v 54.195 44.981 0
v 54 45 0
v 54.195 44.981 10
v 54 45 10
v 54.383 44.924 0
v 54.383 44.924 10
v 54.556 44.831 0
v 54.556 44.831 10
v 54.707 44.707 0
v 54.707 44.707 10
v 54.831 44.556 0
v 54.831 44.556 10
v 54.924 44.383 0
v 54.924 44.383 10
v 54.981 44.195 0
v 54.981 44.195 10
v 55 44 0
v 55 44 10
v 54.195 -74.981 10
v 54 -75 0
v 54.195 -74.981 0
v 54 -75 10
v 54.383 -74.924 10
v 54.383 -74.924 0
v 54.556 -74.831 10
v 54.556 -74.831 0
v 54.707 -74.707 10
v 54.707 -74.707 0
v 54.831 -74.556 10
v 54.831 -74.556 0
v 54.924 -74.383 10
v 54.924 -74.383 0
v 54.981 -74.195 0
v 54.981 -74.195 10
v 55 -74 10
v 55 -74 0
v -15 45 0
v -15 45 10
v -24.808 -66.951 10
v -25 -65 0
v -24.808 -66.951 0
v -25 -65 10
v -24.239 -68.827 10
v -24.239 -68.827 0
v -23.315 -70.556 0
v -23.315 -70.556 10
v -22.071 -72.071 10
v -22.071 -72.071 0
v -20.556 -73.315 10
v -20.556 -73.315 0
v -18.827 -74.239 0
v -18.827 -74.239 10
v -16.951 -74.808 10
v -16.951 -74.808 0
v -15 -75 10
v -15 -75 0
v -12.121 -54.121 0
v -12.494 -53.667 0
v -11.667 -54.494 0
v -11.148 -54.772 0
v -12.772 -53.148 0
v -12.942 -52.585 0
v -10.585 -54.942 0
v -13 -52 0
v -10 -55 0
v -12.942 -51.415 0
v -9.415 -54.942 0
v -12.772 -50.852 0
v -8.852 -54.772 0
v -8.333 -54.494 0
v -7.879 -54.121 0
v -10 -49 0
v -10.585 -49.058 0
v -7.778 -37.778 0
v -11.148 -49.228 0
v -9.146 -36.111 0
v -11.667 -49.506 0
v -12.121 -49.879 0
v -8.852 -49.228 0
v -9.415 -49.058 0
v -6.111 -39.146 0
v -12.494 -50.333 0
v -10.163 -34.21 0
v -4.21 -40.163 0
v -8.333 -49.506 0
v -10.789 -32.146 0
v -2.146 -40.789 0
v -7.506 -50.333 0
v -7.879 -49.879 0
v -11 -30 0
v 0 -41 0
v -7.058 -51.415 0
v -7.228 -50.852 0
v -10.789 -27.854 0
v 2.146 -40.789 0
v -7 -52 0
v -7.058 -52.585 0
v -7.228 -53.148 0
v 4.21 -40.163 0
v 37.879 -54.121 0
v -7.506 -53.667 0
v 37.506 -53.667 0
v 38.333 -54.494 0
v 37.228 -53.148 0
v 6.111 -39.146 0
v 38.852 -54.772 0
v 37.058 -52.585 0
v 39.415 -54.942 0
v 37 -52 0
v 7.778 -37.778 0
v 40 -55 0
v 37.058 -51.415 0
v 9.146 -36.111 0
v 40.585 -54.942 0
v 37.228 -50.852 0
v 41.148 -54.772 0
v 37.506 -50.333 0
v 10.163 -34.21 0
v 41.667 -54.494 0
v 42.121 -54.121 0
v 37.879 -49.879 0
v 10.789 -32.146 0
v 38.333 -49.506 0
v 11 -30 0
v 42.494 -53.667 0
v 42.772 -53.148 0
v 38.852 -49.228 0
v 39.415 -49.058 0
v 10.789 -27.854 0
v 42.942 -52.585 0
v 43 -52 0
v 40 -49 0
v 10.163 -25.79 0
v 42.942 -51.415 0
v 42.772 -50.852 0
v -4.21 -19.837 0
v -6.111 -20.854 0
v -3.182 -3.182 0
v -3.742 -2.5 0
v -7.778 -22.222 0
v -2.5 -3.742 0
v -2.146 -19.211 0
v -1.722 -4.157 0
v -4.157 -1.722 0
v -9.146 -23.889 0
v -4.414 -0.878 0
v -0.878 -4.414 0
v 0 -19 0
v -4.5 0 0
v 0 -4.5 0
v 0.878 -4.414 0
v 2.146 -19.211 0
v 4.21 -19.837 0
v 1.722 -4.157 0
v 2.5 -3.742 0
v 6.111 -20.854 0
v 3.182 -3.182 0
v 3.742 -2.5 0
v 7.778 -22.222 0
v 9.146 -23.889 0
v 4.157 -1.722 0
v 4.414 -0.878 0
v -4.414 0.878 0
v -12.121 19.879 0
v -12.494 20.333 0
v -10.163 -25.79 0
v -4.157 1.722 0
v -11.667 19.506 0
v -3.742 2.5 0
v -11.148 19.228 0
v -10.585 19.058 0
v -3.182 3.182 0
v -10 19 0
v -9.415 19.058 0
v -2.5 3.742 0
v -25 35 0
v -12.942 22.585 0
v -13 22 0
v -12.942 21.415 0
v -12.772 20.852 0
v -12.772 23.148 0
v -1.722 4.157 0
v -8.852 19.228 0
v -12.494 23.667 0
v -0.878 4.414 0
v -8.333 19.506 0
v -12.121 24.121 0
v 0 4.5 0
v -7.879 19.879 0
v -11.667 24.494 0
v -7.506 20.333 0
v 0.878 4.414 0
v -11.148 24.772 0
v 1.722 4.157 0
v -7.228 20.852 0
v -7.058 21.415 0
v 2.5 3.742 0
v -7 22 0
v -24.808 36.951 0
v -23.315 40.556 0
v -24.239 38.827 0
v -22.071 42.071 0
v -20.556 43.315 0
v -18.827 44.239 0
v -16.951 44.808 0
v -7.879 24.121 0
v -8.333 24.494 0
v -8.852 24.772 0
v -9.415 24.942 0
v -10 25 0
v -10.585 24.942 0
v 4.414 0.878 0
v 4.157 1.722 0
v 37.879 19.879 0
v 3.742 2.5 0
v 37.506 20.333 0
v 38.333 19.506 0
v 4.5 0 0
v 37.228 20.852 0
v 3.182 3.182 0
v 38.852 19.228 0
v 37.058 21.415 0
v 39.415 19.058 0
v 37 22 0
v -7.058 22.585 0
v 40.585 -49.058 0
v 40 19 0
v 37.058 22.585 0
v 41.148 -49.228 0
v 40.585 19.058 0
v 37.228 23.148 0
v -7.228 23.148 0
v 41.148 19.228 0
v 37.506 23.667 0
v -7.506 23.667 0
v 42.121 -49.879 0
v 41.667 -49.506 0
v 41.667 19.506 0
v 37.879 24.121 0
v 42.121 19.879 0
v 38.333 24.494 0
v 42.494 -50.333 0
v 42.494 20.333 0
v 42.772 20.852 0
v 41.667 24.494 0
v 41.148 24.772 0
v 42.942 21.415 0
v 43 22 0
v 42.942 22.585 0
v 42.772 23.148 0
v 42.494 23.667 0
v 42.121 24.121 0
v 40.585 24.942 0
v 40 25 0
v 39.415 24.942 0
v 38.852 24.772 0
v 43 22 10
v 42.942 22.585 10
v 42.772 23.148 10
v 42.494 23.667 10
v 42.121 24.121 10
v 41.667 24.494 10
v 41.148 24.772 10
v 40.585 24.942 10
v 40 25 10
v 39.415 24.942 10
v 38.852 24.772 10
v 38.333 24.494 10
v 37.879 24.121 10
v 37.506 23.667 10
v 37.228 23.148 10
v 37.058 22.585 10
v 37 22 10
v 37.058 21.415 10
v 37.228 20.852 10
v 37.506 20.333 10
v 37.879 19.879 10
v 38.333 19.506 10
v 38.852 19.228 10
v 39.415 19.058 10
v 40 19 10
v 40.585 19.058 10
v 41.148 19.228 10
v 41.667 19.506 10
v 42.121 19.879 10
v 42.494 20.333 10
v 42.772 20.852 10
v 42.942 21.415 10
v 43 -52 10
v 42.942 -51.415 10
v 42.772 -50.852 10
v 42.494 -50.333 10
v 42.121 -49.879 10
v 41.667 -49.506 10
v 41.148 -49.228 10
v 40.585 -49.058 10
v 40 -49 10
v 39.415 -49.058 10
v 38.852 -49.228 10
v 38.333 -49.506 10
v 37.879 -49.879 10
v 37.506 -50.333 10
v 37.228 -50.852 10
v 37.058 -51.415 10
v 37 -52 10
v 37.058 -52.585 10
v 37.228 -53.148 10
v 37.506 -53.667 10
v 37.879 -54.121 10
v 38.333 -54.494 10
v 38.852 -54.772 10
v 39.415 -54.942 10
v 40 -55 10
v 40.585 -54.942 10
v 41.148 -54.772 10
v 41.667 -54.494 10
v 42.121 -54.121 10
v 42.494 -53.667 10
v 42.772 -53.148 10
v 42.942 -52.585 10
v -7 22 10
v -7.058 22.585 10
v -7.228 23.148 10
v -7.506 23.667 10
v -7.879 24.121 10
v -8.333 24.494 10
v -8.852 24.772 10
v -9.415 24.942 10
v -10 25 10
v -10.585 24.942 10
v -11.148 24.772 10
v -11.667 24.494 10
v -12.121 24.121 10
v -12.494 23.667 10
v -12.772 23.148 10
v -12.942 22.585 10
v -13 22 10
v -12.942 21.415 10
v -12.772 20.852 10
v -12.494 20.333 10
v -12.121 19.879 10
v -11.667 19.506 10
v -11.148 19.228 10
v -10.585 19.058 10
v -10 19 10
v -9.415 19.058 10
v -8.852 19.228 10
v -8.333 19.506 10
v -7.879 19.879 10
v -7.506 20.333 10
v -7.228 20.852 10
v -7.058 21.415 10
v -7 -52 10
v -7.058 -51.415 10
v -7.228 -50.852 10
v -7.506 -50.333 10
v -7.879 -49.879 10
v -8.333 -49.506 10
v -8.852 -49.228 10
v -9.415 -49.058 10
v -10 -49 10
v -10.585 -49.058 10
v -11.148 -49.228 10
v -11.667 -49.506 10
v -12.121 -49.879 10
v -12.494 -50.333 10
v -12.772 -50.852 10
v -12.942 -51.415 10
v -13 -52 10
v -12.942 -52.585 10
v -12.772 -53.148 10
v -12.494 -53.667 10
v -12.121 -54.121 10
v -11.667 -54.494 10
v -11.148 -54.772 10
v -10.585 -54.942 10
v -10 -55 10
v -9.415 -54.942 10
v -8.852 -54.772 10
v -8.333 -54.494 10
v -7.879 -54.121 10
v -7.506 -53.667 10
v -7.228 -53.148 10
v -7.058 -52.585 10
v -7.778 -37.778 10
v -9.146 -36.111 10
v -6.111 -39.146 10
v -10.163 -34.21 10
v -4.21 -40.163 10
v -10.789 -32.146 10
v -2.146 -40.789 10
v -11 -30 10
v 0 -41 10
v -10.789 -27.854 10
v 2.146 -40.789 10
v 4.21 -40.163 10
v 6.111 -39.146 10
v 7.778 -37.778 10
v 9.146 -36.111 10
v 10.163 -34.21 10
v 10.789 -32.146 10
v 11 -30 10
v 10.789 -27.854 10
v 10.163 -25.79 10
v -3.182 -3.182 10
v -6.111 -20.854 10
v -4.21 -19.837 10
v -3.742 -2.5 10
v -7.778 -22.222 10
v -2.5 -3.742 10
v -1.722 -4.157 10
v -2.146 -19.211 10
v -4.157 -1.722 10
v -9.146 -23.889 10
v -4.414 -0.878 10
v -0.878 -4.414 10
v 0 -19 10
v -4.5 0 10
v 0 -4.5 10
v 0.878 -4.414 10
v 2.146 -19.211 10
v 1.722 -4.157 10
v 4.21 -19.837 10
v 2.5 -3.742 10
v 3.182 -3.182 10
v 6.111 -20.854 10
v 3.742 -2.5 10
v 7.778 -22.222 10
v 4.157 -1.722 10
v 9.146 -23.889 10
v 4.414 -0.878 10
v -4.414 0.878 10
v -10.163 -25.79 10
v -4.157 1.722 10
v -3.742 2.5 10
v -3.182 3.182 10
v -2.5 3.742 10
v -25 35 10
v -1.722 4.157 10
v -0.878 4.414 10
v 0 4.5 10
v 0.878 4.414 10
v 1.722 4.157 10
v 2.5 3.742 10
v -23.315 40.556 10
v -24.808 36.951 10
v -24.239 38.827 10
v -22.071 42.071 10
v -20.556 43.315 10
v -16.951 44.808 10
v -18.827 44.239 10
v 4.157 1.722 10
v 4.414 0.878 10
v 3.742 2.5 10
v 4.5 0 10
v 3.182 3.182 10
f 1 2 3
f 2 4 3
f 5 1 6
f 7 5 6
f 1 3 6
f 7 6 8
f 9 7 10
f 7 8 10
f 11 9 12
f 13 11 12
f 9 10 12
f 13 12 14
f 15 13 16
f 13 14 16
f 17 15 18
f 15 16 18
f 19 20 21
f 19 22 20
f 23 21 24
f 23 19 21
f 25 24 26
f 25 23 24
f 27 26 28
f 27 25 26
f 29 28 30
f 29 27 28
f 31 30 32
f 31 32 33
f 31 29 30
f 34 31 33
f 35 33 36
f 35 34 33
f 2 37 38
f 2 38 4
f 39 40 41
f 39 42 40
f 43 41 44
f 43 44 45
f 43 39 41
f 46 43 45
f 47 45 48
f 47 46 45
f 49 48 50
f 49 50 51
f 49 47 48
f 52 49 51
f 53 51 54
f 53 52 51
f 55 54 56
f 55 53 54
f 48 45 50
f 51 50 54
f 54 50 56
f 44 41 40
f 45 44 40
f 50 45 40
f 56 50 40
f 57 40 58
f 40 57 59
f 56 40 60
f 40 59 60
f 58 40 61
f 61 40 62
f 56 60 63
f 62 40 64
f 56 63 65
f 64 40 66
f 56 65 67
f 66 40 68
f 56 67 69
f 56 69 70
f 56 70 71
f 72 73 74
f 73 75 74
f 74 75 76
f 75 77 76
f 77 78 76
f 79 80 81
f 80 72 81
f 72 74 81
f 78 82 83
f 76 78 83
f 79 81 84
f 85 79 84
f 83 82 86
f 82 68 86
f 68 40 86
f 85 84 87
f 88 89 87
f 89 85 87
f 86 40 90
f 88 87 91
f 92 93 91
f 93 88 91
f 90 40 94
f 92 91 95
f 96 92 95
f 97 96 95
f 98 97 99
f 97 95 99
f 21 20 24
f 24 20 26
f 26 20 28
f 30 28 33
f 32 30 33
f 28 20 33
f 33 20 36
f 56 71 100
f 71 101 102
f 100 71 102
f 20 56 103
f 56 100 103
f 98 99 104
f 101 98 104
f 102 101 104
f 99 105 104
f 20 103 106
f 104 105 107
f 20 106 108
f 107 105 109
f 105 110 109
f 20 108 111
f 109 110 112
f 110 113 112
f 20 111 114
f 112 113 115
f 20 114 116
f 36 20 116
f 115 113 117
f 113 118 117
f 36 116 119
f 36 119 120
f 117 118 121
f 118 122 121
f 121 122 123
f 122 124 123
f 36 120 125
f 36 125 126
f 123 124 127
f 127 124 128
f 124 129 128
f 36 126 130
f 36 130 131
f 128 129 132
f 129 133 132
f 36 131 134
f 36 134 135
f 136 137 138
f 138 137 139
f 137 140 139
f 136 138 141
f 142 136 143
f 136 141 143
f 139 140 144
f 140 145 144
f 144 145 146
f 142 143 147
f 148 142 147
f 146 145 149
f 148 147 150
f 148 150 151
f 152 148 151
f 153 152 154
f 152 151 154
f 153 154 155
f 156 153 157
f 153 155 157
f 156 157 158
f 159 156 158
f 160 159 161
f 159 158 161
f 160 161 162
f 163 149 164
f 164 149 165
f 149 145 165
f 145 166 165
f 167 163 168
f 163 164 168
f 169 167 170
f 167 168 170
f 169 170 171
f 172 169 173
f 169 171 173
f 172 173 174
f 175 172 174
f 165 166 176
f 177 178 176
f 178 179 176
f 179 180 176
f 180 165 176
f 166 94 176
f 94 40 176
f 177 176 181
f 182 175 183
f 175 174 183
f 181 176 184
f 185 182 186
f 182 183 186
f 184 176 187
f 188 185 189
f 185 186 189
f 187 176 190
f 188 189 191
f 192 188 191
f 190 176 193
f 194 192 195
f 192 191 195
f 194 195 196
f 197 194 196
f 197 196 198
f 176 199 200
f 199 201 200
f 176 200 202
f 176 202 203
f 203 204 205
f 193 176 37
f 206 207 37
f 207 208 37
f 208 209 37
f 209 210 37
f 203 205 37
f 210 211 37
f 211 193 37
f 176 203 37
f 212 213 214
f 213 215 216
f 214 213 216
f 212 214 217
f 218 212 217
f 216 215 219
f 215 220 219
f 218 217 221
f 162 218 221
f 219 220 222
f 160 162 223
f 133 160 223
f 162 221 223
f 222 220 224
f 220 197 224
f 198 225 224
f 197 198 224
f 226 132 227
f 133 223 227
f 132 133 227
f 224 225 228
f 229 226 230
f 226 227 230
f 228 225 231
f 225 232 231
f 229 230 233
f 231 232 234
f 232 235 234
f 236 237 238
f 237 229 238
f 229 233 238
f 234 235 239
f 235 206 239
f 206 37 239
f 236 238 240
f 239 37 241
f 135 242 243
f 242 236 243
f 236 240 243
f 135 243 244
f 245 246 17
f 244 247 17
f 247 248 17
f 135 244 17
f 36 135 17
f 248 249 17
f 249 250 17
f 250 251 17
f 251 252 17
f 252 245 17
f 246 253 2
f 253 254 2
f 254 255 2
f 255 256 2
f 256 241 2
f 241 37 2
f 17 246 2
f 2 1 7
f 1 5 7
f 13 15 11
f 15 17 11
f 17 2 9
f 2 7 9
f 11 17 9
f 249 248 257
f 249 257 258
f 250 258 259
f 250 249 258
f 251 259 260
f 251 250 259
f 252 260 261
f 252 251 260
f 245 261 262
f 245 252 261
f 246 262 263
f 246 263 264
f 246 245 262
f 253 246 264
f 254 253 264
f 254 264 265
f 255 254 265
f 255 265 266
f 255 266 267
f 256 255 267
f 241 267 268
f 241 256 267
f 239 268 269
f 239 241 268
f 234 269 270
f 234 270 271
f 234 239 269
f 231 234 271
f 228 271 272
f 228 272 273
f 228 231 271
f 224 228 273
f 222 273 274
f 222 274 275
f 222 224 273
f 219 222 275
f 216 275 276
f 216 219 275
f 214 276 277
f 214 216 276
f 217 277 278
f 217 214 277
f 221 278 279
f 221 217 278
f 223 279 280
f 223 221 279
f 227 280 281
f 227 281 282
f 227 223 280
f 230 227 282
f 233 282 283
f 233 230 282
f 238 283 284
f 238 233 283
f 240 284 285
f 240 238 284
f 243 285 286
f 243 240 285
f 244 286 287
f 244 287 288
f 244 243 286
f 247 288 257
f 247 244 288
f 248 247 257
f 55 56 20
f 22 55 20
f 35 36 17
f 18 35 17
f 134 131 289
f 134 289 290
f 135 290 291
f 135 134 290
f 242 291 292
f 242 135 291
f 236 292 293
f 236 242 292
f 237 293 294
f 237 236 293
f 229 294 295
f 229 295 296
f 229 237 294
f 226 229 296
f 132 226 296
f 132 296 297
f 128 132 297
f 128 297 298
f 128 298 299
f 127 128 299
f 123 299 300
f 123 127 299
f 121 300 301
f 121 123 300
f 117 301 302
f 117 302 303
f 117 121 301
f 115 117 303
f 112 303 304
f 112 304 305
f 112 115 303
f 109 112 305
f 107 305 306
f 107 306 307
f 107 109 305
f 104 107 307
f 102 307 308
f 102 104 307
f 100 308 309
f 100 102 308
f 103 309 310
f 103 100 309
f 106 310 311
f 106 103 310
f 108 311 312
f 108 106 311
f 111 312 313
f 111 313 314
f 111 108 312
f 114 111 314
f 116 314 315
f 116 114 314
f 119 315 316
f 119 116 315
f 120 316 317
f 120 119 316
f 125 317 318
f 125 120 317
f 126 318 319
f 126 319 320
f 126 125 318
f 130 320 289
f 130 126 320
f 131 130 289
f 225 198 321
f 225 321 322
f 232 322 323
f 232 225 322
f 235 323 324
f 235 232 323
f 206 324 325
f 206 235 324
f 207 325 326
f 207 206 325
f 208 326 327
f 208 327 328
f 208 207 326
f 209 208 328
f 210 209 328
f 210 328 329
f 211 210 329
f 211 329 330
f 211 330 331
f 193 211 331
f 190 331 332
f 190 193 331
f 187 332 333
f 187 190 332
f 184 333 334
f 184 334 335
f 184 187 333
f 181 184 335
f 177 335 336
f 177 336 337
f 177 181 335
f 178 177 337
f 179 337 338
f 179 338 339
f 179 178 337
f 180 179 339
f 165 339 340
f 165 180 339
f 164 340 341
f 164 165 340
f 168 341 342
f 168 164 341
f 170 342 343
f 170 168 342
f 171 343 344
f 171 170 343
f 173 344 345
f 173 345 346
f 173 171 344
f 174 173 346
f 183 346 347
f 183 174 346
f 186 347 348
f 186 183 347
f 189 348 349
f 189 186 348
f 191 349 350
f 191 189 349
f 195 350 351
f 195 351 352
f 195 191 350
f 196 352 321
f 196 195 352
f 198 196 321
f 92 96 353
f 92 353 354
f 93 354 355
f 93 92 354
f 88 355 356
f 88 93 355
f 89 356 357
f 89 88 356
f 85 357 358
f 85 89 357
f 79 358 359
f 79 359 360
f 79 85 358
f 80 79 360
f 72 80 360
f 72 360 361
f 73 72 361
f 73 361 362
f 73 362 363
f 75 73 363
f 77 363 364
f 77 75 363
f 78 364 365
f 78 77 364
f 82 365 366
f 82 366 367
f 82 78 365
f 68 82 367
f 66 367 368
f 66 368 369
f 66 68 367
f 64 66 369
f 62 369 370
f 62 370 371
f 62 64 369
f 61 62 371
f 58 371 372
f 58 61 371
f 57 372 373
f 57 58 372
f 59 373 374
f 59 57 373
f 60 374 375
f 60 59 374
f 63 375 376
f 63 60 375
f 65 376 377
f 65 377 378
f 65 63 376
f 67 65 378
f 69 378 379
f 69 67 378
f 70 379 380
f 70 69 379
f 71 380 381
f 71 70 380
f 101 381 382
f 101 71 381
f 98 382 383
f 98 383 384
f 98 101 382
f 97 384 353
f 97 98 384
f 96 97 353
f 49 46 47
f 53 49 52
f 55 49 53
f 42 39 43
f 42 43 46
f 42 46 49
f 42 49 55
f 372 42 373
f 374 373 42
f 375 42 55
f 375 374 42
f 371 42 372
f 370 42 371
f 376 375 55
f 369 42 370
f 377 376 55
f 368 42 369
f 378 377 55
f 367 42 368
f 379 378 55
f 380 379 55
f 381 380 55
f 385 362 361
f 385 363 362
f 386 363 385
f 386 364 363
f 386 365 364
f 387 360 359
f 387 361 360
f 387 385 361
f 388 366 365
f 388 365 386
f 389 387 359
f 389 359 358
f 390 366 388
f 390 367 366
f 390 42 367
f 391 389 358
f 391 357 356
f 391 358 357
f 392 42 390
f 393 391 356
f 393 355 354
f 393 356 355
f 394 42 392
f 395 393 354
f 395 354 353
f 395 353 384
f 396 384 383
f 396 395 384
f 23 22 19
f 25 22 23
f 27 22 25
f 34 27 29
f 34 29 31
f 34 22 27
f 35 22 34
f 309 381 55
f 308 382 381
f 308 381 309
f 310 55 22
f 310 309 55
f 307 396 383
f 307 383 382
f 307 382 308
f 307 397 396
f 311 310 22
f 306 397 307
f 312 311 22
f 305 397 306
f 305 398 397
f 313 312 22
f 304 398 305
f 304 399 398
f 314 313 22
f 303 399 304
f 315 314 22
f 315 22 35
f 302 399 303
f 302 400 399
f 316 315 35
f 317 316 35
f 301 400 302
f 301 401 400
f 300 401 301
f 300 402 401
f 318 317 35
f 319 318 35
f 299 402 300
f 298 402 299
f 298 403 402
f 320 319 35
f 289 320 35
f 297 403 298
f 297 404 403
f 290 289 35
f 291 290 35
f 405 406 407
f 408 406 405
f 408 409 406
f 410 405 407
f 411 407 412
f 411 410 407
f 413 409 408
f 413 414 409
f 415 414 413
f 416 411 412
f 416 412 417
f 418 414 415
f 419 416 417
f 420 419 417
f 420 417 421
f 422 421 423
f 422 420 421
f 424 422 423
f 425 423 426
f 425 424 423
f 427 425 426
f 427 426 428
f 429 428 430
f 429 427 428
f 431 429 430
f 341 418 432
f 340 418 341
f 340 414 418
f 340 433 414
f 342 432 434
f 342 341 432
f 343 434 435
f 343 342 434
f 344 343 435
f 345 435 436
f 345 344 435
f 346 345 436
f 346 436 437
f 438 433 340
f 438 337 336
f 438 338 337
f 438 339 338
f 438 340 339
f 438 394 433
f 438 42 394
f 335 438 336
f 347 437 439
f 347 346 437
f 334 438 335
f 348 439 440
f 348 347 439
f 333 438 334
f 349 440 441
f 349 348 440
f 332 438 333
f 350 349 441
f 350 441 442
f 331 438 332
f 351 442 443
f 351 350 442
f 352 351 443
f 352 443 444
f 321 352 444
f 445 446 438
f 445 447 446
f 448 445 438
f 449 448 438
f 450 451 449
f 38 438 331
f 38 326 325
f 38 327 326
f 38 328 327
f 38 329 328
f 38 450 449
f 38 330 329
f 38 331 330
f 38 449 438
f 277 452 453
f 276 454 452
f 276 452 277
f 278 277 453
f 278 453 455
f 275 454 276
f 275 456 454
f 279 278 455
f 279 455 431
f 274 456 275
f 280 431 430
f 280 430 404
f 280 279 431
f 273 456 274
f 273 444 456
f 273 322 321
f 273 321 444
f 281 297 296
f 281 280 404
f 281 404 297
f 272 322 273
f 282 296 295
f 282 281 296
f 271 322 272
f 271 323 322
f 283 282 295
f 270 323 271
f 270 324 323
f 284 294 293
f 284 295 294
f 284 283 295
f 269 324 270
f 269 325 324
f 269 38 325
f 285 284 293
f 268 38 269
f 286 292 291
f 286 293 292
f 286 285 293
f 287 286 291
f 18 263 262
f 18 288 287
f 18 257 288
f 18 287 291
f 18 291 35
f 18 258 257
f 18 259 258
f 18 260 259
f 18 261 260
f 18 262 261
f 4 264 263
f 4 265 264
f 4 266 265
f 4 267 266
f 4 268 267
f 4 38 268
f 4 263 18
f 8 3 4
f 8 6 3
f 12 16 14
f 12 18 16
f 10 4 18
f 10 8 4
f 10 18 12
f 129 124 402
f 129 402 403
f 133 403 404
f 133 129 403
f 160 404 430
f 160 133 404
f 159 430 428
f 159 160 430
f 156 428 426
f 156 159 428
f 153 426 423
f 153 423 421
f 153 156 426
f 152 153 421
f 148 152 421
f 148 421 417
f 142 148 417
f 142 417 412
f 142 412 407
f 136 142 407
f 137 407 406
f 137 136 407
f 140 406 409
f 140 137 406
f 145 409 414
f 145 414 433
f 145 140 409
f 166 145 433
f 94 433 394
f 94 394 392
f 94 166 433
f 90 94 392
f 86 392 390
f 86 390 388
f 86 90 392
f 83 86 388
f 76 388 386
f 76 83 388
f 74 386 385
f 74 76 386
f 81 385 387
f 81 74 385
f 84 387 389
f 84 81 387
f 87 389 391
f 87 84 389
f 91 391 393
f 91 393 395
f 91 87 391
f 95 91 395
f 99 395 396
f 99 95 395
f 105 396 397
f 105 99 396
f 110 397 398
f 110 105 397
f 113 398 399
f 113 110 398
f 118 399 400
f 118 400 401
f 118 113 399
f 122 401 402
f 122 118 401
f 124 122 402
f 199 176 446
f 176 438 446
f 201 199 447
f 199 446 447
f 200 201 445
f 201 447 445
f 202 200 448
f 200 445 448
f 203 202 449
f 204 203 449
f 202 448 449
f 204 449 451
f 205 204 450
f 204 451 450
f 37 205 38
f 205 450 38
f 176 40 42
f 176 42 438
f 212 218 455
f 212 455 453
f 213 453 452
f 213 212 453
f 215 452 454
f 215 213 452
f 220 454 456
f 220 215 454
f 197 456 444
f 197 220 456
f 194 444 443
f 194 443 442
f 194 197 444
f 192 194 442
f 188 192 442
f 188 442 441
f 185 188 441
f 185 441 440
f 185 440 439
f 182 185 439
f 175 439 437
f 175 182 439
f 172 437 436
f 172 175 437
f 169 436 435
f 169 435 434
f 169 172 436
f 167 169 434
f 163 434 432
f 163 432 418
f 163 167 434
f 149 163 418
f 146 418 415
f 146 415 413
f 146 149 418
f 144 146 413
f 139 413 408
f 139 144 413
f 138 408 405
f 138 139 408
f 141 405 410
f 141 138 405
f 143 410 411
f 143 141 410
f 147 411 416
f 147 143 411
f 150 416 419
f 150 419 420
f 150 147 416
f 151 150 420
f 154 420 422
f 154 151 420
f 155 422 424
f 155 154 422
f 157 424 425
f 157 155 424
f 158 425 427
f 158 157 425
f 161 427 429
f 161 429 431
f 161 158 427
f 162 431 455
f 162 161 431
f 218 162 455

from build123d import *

# Parameters (mm, degrees)
SKETCH_W    = 80
SKETCH_H    = 120
SKETCH_R    = 4.5
SKETCH_R_2  = 11
SKETCH_R_3  = 3
PAD_DEPTH   = 10
FILLET_R    = 10
FILLET001_R = 1


with BuildPart() as part:
    # Sketch → Pad (new body)
    with BuildSketch(Plane.XY):
        with Locations((15, -15)):
            Rectangle(SKETCH_W, SKETCH_H)
        Circle(SKETCH_R, mode=Mode.SUBTRACT)
        with Locations((0, -30)):
            Circle(SKETCH_R_2, mode=Mode.SUBTRACT)
        with Locations((-10, -52)):
            Circle(SKETCH_R_3, mode=Mode.SUBTRACT)
        with Locations((40, -52)):
            Circle(SKETCH_R_3, mode=Mode.SUBTRACT)
        with Locations((40, 22)):
            Circle(SKETCH_R_3, mode=Mode.SUBTRACT)
        with Locations((-10, 22)):
            Circle(SKETCH_R_3, mode=Mode.SUBTRACT)
    extrude(amount=PAD_DEPTH)

    # Fillet
    fillet_edges = [part.edges().sort_by_distance(p)[0] for p in [
        (-25, -75, 5),
        (-25, 45, 5),
    ]]
    fillet(fillet_edges, radius=FILLET_R)

    # Fillet001
    fillet001_edges = [part.edges().sort_by_distance(p)[0] for p in [
        (55, -75, 5),
        (55, 45, 5),
    ]]
    fillet(fillet001_edges, radius=FILLET001_R)


solid = part.part
